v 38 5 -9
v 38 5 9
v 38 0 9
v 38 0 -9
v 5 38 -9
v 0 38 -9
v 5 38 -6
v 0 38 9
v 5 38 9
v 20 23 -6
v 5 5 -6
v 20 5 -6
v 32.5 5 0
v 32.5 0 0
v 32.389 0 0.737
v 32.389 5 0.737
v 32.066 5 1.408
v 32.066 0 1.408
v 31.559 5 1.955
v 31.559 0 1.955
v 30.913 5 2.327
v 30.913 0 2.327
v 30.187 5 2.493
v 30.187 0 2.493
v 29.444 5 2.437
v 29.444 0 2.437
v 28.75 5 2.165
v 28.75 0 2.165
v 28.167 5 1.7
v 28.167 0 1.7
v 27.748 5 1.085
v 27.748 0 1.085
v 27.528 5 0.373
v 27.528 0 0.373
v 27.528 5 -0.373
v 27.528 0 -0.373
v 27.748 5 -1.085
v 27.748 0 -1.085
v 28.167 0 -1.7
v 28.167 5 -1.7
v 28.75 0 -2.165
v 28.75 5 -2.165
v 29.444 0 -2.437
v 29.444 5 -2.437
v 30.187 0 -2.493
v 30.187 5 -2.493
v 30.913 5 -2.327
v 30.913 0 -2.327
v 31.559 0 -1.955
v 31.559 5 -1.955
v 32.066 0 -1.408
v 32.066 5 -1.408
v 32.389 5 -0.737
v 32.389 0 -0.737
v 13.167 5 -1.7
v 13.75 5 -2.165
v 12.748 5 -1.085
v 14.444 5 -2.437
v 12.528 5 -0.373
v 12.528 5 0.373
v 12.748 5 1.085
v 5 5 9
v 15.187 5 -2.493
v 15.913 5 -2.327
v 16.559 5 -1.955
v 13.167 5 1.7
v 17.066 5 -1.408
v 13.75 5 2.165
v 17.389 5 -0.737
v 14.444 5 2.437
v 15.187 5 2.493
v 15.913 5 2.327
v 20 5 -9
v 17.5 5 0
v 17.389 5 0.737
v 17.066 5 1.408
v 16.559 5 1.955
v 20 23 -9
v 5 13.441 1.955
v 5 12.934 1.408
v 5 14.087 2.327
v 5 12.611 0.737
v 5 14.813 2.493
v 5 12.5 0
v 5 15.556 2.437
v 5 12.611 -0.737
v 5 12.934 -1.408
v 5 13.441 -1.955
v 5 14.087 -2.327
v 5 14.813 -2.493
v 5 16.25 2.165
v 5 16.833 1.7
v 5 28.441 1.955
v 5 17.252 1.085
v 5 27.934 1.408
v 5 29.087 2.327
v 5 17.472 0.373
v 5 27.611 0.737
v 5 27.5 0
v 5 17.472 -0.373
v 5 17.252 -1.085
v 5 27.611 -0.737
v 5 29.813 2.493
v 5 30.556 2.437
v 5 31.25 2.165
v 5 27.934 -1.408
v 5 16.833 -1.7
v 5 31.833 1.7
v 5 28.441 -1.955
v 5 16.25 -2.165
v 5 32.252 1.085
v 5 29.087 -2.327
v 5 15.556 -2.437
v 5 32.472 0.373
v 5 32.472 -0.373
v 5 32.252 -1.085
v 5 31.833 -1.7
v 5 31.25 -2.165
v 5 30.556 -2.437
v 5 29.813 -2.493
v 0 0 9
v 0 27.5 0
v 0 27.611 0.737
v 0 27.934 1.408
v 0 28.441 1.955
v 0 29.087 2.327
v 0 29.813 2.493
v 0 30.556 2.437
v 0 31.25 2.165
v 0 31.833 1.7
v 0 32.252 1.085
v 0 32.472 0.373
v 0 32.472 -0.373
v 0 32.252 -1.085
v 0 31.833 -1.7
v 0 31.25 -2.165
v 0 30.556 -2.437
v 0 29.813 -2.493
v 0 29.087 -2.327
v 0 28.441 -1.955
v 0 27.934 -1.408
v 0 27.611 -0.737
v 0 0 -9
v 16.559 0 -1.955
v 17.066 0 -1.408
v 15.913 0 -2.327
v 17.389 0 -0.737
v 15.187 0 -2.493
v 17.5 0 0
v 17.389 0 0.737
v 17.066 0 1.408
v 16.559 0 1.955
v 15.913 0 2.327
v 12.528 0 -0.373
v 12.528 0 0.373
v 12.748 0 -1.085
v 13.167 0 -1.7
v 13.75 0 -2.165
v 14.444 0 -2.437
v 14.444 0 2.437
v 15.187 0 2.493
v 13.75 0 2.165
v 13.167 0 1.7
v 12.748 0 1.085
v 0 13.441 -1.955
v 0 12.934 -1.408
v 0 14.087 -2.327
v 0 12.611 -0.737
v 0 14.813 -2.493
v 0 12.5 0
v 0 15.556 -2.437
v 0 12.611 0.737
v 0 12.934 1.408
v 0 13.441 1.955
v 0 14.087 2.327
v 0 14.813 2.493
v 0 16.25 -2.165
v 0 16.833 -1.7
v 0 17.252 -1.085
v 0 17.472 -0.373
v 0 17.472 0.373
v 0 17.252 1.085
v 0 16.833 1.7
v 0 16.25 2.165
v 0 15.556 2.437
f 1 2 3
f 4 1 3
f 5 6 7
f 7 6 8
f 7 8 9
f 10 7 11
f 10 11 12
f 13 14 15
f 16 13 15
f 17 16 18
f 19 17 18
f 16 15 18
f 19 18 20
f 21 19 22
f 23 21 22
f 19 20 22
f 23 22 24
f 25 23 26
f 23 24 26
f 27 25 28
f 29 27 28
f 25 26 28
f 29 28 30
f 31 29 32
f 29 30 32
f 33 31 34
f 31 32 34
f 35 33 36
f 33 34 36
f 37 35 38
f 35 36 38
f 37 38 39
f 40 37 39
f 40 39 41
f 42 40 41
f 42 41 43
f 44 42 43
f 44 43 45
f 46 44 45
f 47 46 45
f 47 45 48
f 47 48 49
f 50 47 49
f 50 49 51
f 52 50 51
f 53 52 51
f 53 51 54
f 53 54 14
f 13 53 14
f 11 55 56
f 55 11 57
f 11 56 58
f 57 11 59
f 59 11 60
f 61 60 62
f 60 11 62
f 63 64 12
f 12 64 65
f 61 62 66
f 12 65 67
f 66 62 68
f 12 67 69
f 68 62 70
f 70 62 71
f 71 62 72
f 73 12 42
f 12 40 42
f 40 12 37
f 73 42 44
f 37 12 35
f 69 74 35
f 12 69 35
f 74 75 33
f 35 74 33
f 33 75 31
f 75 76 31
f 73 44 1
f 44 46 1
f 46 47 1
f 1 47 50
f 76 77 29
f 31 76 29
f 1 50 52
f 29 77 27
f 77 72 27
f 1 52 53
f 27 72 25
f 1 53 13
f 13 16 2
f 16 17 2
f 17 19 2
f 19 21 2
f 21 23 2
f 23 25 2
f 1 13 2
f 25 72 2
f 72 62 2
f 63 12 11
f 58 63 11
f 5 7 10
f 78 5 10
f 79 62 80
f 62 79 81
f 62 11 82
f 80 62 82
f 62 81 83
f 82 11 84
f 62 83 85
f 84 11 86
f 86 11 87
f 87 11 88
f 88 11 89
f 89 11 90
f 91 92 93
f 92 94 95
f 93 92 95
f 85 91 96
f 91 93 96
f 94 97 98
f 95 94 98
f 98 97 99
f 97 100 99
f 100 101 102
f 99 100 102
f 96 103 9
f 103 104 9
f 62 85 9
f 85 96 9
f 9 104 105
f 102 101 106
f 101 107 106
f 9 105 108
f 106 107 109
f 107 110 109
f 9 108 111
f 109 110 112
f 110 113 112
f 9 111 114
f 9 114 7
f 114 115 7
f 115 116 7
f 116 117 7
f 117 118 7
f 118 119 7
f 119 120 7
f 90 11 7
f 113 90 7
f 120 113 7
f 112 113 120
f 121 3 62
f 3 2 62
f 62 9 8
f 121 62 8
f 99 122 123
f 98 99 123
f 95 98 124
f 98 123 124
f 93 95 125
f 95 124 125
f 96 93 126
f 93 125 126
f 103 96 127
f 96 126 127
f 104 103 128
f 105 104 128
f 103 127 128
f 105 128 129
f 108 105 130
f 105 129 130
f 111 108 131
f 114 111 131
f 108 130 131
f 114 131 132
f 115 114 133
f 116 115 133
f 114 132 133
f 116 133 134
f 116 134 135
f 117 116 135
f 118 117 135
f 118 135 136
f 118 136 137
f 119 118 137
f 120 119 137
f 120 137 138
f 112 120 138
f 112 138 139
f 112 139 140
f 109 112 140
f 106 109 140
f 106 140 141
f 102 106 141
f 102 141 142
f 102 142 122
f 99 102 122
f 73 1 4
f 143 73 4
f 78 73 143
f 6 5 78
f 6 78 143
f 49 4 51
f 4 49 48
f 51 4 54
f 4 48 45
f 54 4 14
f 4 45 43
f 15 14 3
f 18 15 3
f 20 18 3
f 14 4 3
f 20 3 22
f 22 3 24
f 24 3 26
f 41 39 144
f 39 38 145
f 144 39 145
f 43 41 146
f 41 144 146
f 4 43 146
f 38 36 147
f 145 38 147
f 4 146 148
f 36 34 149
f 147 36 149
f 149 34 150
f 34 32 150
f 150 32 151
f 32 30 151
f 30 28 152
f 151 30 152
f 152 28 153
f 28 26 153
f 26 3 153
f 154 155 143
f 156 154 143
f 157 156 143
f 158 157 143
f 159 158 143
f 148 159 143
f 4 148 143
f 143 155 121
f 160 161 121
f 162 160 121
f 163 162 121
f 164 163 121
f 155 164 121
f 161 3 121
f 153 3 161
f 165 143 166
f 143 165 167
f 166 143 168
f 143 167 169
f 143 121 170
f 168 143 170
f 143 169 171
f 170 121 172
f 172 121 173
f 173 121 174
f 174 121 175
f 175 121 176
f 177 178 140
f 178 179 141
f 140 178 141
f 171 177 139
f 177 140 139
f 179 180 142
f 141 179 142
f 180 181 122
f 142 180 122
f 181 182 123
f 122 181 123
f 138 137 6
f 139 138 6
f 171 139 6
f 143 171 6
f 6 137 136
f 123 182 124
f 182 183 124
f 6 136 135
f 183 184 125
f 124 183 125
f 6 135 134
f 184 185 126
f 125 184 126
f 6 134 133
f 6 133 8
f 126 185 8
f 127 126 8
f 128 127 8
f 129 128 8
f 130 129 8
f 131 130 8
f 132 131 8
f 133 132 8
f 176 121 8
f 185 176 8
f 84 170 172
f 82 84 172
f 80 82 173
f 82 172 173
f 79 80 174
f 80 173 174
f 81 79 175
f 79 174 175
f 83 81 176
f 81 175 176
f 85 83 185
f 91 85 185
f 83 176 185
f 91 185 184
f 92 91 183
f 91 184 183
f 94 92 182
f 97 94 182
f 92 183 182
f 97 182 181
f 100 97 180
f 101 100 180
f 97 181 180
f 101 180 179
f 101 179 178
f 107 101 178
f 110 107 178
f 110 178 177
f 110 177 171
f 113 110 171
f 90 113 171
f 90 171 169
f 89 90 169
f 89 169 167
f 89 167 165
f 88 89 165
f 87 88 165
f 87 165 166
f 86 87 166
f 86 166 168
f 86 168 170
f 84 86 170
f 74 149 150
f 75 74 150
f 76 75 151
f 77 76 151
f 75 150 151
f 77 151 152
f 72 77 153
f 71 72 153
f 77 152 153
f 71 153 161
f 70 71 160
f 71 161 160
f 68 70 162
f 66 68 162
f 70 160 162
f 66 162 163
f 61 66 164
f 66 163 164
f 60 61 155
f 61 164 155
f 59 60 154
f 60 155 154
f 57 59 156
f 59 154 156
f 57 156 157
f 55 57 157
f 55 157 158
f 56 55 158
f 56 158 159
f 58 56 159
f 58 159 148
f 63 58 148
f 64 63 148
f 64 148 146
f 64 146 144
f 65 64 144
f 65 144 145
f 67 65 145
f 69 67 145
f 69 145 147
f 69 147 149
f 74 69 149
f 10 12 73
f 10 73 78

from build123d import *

# Parameters (mm, degrees)
PAD_DEPTH            = 9
SKETCH001_W          = 37.346859
SKETCH001_H          = 35.838272
POCKET_DEPTH         = 6
POCKET_DEPTH_BACK    = 100
SKETCH002_R          = 2.5
POCKET001_DEPTH      = 38.001
SKETCH003_R          = 2.5
POCKET002_DEPTH      = 38.001
SKETCH004_W          = 20
SKETCH004_H          = 20
POCKET003_DEPTH      = 9.001
POCKET003_DEPTH_BACK = 9.001


with BuildPart() as part:
    # Sketch → Pad (new body, symmetric)
    with BuildSketch(Plane.XY):
        Polygon((0, 0), (0, 38), (5, 38), (38, 5), (38, 0), align=None)
    extrude(amount=PAD_DEPTH, both=True)

    # Sketch001 → Pocket (cut, two sides)
    with BuildSketch(Plane.XY) as pocket_sk:
        with Locations((23.673429, 22.919136)):
            Rectangle(SKETCH001_W, SKETCH001_H)
    extrude(amount=-POCKET_DEPTH, mode=Mode.SUBTRACT)
    extrude(pocket_sk.sketch, amount=POCKET_DEPTH_BACK, mode=Mode.SUBTRACT)

    # Sketch002 (on Face2 of Pocket) → Pocket001 (cut, through all)
    with BuildSketch(Plane.XZ):
        with Locations((15, 0)):
            Circle(SKETCH002_R)
        with Locations((30, 0)):
            Circle(SKETCH002_R)
    extrude(amount=-POCKET001_DEPTH, mode=Mode.SUBTRACT)

    # Sketch003 (on Face1 of Pocket001) → Pocket002 (cut, through all)
    with BuildSketch(Plane(origin=(0, 0, 0), x_dir=(0, -1, 0), z_dir=(-1, 0, 0))):
        with Locations((-30, 0)):
            Circle(SKETCH003_R)
        with Locations((-15, 0)):
            Circle(SKETCH003_R)
    extrude(amount=-POCKET002_DEPTH, mode=Mode.SUBTRACT)

    # Sketch004 → Pocket003 (cut, two sides)
    with BuildSketch(Plane.XY) as pocket003_sk:
        with Locations((30, 15)):
            Rectangle(SKETCH004_W, SKETCH004_H)
    extrude(amount=-POCKET003_DEPTH, mode=Mode.SUBTRACT)
    extrude(pocket003_sk.sketch, amount=POCKET003_DEPTH_BACK, mode=Mode.SUBTRACT)


solid = part.part
